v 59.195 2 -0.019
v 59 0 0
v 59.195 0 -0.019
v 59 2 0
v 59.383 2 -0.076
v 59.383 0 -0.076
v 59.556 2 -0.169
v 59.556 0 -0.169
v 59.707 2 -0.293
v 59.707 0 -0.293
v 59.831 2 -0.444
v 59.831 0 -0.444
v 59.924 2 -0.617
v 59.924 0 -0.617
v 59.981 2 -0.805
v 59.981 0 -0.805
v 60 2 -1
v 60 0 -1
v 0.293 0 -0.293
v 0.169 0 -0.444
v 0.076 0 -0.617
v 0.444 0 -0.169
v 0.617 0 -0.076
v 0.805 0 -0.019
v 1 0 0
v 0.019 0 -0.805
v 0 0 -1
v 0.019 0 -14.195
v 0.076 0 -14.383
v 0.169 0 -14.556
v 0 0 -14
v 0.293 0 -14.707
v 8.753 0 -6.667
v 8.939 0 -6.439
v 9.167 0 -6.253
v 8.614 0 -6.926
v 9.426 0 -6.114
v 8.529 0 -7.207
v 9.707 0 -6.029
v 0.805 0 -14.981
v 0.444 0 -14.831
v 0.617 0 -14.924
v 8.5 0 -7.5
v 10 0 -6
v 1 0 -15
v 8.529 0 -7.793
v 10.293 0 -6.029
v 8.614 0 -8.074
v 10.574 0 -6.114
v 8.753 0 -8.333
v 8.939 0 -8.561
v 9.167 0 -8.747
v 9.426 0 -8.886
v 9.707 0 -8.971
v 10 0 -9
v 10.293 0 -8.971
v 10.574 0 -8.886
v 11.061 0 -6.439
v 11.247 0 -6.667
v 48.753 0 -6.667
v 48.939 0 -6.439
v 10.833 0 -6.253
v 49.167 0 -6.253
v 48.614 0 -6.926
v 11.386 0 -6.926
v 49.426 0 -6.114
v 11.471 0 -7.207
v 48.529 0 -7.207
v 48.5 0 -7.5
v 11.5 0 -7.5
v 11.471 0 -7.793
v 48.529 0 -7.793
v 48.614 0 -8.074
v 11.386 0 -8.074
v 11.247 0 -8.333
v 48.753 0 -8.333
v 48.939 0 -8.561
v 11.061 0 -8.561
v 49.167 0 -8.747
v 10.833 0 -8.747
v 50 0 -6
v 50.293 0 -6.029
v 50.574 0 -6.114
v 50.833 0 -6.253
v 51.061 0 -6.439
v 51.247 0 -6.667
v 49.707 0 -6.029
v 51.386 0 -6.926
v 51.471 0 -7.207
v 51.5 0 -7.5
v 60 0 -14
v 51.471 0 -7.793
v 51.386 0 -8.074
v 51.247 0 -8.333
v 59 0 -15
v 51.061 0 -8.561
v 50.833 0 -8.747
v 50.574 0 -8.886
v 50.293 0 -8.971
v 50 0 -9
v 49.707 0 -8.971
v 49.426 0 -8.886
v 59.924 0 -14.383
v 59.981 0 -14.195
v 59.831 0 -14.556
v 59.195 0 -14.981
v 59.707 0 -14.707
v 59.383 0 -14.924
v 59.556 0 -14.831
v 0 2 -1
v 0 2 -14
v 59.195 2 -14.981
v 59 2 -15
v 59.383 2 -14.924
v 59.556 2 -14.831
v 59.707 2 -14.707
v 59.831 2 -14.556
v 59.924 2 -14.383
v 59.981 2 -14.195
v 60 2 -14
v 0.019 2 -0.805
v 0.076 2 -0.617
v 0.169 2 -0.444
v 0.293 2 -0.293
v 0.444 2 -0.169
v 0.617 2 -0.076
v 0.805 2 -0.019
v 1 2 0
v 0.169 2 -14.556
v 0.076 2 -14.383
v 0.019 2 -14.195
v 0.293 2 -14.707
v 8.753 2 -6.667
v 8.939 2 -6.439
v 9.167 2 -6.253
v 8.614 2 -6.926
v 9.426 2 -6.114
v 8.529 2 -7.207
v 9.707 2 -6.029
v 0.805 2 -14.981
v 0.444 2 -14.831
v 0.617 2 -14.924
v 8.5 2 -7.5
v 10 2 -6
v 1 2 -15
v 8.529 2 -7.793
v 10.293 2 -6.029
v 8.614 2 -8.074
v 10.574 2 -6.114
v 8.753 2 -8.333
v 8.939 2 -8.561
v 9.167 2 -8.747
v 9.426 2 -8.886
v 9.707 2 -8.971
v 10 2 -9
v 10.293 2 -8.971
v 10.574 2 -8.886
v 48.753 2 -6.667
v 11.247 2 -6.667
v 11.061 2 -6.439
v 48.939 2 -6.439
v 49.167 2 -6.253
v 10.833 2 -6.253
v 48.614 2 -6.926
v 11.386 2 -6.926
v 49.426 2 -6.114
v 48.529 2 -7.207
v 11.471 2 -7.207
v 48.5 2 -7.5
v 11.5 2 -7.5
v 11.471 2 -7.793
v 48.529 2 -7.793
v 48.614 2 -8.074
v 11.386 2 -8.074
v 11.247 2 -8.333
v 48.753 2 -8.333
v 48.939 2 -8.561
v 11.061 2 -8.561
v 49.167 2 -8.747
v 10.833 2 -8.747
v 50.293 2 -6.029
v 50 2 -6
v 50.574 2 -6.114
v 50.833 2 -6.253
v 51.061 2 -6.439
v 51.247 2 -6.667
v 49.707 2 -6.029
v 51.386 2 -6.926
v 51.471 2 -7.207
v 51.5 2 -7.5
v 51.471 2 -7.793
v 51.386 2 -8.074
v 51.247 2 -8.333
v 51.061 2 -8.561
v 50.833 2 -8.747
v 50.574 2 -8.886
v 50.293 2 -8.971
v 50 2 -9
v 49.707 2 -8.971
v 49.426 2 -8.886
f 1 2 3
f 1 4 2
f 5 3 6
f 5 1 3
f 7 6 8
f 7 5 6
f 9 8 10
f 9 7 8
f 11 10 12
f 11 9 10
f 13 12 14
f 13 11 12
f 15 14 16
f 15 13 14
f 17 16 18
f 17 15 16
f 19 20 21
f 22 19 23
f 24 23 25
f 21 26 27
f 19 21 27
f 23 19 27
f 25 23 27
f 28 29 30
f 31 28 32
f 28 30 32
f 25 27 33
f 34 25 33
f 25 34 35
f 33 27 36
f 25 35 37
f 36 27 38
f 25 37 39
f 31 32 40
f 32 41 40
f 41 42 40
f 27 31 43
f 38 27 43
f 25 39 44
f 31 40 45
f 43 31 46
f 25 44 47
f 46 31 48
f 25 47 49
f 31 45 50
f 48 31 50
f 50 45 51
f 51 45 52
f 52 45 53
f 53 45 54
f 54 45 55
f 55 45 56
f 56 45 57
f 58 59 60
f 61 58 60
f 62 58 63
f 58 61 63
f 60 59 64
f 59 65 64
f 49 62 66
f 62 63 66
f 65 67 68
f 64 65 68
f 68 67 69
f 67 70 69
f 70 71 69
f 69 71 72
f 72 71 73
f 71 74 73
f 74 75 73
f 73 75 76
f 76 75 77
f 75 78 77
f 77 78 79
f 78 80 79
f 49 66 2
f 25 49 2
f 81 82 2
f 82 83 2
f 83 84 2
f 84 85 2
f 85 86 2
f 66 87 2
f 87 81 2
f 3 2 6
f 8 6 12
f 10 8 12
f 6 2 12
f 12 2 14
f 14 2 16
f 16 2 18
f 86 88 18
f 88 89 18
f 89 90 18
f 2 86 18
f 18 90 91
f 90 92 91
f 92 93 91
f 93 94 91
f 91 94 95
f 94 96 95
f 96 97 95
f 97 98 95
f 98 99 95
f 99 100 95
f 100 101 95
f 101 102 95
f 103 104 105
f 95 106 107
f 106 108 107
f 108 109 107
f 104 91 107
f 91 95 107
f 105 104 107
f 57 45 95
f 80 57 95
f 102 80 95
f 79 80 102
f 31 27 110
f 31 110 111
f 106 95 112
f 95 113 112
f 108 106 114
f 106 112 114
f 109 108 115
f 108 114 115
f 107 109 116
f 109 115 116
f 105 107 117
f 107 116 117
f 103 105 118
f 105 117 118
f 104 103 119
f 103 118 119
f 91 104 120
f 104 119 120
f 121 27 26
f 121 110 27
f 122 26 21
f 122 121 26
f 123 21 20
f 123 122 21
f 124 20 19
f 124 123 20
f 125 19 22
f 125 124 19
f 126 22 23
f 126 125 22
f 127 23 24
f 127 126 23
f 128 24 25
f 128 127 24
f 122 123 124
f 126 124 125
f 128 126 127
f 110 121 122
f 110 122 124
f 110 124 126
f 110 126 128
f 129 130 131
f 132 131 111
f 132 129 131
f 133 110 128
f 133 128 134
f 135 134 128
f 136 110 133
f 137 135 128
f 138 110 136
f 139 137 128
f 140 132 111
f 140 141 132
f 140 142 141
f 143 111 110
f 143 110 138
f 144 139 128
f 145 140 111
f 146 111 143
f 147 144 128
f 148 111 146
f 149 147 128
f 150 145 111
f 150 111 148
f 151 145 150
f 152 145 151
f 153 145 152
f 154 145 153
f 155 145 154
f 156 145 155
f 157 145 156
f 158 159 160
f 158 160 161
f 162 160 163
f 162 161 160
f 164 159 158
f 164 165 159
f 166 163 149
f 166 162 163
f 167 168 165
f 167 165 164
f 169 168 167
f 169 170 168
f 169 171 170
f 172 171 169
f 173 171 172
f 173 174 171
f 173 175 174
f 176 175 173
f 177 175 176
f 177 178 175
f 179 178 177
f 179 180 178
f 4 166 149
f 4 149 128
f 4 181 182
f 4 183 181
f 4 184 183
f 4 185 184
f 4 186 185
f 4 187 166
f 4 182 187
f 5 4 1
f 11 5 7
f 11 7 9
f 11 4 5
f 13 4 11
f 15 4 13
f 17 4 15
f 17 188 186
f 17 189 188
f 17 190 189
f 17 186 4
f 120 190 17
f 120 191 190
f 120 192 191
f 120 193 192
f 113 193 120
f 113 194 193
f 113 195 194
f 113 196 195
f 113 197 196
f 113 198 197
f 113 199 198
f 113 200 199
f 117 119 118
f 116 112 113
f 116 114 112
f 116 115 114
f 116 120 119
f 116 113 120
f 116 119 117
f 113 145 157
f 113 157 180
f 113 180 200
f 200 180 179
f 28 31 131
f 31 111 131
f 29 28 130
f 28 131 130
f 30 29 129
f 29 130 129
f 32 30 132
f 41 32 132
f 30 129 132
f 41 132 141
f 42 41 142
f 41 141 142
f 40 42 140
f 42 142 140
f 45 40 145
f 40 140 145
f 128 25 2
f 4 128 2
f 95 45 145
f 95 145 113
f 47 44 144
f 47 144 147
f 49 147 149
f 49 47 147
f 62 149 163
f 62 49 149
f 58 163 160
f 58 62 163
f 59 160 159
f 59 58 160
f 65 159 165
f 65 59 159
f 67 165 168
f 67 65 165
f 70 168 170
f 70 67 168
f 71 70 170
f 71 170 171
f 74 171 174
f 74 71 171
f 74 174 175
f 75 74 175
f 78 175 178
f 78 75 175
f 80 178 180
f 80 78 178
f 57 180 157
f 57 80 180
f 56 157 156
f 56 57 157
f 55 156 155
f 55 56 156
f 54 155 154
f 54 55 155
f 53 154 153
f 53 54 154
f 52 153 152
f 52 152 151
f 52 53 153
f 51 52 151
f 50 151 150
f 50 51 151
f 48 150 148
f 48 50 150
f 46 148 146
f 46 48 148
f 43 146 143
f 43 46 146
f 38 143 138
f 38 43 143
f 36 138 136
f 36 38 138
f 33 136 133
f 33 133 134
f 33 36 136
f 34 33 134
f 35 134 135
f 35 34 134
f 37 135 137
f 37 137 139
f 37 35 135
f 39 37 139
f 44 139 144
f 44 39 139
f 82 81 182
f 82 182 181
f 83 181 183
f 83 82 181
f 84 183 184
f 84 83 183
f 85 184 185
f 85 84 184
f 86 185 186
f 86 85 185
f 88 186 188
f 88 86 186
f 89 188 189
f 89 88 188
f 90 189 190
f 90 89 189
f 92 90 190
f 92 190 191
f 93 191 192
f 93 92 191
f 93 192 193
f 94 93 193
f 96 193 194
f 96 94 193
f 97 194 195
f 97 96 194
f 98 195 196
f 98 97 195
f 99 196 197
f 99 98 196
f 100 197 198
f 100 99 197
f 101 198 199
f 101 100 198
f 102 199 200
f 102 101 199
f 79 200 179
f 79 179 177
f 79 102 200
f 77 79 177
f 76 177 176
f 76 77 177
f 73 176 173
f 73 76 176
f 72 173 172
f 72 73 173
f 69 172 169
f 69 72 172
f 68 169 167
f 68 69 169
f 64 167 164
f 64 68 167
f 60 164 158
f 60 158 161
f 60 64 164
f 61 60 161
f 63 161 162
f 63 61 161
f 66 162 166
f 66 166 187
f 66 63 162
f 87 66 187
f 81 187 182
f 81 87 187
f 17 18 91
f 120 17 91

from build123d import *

# Parameters (mm, degrees)
SKETCH1_W           = 60
SKETCH1_H           = 15
SKETCH1_R           = 1.5
BOSS_EXTRUDE1_DEPTH = 2
FILLET1_R           = 1


with BuildPart() as part:
    # Sketch1 → Boss-Extrude1 (new body)
    with BuildSketch(Plane(origin=(0, 0, 0), x_dir=(1, 0, 0), z_dir=(0, 1, 0))):
        with Locations((30, 7.5)):
            Rectangle(SKETCH1_W, SKETCH1_H)
        with Locations(Location((50, 7.5, 0), (0, 0, 270))):
            Circle(SKETCH1_R, mode=Mode.SUBTRACT)
        with Locations(Location((10, 7.5, 0), (0, 0, 270))):
            Circle(SKETCH1_R, mode=Mode.SUBTRACT)
    extrude(amount=BOSS_EXTRUDE1_DEPTH)

    # Fillet1
    fillet1_edges = [part.edges().sort_by_distance(p)[0] for p in [
        (0, 1, 0),
        (0, 1, -15),
        (60, 1, -15),
        (60, 1, 0),
    ]]
    fillet(fillet1_edges, radius=FILLET1_R)


solid = part.part
